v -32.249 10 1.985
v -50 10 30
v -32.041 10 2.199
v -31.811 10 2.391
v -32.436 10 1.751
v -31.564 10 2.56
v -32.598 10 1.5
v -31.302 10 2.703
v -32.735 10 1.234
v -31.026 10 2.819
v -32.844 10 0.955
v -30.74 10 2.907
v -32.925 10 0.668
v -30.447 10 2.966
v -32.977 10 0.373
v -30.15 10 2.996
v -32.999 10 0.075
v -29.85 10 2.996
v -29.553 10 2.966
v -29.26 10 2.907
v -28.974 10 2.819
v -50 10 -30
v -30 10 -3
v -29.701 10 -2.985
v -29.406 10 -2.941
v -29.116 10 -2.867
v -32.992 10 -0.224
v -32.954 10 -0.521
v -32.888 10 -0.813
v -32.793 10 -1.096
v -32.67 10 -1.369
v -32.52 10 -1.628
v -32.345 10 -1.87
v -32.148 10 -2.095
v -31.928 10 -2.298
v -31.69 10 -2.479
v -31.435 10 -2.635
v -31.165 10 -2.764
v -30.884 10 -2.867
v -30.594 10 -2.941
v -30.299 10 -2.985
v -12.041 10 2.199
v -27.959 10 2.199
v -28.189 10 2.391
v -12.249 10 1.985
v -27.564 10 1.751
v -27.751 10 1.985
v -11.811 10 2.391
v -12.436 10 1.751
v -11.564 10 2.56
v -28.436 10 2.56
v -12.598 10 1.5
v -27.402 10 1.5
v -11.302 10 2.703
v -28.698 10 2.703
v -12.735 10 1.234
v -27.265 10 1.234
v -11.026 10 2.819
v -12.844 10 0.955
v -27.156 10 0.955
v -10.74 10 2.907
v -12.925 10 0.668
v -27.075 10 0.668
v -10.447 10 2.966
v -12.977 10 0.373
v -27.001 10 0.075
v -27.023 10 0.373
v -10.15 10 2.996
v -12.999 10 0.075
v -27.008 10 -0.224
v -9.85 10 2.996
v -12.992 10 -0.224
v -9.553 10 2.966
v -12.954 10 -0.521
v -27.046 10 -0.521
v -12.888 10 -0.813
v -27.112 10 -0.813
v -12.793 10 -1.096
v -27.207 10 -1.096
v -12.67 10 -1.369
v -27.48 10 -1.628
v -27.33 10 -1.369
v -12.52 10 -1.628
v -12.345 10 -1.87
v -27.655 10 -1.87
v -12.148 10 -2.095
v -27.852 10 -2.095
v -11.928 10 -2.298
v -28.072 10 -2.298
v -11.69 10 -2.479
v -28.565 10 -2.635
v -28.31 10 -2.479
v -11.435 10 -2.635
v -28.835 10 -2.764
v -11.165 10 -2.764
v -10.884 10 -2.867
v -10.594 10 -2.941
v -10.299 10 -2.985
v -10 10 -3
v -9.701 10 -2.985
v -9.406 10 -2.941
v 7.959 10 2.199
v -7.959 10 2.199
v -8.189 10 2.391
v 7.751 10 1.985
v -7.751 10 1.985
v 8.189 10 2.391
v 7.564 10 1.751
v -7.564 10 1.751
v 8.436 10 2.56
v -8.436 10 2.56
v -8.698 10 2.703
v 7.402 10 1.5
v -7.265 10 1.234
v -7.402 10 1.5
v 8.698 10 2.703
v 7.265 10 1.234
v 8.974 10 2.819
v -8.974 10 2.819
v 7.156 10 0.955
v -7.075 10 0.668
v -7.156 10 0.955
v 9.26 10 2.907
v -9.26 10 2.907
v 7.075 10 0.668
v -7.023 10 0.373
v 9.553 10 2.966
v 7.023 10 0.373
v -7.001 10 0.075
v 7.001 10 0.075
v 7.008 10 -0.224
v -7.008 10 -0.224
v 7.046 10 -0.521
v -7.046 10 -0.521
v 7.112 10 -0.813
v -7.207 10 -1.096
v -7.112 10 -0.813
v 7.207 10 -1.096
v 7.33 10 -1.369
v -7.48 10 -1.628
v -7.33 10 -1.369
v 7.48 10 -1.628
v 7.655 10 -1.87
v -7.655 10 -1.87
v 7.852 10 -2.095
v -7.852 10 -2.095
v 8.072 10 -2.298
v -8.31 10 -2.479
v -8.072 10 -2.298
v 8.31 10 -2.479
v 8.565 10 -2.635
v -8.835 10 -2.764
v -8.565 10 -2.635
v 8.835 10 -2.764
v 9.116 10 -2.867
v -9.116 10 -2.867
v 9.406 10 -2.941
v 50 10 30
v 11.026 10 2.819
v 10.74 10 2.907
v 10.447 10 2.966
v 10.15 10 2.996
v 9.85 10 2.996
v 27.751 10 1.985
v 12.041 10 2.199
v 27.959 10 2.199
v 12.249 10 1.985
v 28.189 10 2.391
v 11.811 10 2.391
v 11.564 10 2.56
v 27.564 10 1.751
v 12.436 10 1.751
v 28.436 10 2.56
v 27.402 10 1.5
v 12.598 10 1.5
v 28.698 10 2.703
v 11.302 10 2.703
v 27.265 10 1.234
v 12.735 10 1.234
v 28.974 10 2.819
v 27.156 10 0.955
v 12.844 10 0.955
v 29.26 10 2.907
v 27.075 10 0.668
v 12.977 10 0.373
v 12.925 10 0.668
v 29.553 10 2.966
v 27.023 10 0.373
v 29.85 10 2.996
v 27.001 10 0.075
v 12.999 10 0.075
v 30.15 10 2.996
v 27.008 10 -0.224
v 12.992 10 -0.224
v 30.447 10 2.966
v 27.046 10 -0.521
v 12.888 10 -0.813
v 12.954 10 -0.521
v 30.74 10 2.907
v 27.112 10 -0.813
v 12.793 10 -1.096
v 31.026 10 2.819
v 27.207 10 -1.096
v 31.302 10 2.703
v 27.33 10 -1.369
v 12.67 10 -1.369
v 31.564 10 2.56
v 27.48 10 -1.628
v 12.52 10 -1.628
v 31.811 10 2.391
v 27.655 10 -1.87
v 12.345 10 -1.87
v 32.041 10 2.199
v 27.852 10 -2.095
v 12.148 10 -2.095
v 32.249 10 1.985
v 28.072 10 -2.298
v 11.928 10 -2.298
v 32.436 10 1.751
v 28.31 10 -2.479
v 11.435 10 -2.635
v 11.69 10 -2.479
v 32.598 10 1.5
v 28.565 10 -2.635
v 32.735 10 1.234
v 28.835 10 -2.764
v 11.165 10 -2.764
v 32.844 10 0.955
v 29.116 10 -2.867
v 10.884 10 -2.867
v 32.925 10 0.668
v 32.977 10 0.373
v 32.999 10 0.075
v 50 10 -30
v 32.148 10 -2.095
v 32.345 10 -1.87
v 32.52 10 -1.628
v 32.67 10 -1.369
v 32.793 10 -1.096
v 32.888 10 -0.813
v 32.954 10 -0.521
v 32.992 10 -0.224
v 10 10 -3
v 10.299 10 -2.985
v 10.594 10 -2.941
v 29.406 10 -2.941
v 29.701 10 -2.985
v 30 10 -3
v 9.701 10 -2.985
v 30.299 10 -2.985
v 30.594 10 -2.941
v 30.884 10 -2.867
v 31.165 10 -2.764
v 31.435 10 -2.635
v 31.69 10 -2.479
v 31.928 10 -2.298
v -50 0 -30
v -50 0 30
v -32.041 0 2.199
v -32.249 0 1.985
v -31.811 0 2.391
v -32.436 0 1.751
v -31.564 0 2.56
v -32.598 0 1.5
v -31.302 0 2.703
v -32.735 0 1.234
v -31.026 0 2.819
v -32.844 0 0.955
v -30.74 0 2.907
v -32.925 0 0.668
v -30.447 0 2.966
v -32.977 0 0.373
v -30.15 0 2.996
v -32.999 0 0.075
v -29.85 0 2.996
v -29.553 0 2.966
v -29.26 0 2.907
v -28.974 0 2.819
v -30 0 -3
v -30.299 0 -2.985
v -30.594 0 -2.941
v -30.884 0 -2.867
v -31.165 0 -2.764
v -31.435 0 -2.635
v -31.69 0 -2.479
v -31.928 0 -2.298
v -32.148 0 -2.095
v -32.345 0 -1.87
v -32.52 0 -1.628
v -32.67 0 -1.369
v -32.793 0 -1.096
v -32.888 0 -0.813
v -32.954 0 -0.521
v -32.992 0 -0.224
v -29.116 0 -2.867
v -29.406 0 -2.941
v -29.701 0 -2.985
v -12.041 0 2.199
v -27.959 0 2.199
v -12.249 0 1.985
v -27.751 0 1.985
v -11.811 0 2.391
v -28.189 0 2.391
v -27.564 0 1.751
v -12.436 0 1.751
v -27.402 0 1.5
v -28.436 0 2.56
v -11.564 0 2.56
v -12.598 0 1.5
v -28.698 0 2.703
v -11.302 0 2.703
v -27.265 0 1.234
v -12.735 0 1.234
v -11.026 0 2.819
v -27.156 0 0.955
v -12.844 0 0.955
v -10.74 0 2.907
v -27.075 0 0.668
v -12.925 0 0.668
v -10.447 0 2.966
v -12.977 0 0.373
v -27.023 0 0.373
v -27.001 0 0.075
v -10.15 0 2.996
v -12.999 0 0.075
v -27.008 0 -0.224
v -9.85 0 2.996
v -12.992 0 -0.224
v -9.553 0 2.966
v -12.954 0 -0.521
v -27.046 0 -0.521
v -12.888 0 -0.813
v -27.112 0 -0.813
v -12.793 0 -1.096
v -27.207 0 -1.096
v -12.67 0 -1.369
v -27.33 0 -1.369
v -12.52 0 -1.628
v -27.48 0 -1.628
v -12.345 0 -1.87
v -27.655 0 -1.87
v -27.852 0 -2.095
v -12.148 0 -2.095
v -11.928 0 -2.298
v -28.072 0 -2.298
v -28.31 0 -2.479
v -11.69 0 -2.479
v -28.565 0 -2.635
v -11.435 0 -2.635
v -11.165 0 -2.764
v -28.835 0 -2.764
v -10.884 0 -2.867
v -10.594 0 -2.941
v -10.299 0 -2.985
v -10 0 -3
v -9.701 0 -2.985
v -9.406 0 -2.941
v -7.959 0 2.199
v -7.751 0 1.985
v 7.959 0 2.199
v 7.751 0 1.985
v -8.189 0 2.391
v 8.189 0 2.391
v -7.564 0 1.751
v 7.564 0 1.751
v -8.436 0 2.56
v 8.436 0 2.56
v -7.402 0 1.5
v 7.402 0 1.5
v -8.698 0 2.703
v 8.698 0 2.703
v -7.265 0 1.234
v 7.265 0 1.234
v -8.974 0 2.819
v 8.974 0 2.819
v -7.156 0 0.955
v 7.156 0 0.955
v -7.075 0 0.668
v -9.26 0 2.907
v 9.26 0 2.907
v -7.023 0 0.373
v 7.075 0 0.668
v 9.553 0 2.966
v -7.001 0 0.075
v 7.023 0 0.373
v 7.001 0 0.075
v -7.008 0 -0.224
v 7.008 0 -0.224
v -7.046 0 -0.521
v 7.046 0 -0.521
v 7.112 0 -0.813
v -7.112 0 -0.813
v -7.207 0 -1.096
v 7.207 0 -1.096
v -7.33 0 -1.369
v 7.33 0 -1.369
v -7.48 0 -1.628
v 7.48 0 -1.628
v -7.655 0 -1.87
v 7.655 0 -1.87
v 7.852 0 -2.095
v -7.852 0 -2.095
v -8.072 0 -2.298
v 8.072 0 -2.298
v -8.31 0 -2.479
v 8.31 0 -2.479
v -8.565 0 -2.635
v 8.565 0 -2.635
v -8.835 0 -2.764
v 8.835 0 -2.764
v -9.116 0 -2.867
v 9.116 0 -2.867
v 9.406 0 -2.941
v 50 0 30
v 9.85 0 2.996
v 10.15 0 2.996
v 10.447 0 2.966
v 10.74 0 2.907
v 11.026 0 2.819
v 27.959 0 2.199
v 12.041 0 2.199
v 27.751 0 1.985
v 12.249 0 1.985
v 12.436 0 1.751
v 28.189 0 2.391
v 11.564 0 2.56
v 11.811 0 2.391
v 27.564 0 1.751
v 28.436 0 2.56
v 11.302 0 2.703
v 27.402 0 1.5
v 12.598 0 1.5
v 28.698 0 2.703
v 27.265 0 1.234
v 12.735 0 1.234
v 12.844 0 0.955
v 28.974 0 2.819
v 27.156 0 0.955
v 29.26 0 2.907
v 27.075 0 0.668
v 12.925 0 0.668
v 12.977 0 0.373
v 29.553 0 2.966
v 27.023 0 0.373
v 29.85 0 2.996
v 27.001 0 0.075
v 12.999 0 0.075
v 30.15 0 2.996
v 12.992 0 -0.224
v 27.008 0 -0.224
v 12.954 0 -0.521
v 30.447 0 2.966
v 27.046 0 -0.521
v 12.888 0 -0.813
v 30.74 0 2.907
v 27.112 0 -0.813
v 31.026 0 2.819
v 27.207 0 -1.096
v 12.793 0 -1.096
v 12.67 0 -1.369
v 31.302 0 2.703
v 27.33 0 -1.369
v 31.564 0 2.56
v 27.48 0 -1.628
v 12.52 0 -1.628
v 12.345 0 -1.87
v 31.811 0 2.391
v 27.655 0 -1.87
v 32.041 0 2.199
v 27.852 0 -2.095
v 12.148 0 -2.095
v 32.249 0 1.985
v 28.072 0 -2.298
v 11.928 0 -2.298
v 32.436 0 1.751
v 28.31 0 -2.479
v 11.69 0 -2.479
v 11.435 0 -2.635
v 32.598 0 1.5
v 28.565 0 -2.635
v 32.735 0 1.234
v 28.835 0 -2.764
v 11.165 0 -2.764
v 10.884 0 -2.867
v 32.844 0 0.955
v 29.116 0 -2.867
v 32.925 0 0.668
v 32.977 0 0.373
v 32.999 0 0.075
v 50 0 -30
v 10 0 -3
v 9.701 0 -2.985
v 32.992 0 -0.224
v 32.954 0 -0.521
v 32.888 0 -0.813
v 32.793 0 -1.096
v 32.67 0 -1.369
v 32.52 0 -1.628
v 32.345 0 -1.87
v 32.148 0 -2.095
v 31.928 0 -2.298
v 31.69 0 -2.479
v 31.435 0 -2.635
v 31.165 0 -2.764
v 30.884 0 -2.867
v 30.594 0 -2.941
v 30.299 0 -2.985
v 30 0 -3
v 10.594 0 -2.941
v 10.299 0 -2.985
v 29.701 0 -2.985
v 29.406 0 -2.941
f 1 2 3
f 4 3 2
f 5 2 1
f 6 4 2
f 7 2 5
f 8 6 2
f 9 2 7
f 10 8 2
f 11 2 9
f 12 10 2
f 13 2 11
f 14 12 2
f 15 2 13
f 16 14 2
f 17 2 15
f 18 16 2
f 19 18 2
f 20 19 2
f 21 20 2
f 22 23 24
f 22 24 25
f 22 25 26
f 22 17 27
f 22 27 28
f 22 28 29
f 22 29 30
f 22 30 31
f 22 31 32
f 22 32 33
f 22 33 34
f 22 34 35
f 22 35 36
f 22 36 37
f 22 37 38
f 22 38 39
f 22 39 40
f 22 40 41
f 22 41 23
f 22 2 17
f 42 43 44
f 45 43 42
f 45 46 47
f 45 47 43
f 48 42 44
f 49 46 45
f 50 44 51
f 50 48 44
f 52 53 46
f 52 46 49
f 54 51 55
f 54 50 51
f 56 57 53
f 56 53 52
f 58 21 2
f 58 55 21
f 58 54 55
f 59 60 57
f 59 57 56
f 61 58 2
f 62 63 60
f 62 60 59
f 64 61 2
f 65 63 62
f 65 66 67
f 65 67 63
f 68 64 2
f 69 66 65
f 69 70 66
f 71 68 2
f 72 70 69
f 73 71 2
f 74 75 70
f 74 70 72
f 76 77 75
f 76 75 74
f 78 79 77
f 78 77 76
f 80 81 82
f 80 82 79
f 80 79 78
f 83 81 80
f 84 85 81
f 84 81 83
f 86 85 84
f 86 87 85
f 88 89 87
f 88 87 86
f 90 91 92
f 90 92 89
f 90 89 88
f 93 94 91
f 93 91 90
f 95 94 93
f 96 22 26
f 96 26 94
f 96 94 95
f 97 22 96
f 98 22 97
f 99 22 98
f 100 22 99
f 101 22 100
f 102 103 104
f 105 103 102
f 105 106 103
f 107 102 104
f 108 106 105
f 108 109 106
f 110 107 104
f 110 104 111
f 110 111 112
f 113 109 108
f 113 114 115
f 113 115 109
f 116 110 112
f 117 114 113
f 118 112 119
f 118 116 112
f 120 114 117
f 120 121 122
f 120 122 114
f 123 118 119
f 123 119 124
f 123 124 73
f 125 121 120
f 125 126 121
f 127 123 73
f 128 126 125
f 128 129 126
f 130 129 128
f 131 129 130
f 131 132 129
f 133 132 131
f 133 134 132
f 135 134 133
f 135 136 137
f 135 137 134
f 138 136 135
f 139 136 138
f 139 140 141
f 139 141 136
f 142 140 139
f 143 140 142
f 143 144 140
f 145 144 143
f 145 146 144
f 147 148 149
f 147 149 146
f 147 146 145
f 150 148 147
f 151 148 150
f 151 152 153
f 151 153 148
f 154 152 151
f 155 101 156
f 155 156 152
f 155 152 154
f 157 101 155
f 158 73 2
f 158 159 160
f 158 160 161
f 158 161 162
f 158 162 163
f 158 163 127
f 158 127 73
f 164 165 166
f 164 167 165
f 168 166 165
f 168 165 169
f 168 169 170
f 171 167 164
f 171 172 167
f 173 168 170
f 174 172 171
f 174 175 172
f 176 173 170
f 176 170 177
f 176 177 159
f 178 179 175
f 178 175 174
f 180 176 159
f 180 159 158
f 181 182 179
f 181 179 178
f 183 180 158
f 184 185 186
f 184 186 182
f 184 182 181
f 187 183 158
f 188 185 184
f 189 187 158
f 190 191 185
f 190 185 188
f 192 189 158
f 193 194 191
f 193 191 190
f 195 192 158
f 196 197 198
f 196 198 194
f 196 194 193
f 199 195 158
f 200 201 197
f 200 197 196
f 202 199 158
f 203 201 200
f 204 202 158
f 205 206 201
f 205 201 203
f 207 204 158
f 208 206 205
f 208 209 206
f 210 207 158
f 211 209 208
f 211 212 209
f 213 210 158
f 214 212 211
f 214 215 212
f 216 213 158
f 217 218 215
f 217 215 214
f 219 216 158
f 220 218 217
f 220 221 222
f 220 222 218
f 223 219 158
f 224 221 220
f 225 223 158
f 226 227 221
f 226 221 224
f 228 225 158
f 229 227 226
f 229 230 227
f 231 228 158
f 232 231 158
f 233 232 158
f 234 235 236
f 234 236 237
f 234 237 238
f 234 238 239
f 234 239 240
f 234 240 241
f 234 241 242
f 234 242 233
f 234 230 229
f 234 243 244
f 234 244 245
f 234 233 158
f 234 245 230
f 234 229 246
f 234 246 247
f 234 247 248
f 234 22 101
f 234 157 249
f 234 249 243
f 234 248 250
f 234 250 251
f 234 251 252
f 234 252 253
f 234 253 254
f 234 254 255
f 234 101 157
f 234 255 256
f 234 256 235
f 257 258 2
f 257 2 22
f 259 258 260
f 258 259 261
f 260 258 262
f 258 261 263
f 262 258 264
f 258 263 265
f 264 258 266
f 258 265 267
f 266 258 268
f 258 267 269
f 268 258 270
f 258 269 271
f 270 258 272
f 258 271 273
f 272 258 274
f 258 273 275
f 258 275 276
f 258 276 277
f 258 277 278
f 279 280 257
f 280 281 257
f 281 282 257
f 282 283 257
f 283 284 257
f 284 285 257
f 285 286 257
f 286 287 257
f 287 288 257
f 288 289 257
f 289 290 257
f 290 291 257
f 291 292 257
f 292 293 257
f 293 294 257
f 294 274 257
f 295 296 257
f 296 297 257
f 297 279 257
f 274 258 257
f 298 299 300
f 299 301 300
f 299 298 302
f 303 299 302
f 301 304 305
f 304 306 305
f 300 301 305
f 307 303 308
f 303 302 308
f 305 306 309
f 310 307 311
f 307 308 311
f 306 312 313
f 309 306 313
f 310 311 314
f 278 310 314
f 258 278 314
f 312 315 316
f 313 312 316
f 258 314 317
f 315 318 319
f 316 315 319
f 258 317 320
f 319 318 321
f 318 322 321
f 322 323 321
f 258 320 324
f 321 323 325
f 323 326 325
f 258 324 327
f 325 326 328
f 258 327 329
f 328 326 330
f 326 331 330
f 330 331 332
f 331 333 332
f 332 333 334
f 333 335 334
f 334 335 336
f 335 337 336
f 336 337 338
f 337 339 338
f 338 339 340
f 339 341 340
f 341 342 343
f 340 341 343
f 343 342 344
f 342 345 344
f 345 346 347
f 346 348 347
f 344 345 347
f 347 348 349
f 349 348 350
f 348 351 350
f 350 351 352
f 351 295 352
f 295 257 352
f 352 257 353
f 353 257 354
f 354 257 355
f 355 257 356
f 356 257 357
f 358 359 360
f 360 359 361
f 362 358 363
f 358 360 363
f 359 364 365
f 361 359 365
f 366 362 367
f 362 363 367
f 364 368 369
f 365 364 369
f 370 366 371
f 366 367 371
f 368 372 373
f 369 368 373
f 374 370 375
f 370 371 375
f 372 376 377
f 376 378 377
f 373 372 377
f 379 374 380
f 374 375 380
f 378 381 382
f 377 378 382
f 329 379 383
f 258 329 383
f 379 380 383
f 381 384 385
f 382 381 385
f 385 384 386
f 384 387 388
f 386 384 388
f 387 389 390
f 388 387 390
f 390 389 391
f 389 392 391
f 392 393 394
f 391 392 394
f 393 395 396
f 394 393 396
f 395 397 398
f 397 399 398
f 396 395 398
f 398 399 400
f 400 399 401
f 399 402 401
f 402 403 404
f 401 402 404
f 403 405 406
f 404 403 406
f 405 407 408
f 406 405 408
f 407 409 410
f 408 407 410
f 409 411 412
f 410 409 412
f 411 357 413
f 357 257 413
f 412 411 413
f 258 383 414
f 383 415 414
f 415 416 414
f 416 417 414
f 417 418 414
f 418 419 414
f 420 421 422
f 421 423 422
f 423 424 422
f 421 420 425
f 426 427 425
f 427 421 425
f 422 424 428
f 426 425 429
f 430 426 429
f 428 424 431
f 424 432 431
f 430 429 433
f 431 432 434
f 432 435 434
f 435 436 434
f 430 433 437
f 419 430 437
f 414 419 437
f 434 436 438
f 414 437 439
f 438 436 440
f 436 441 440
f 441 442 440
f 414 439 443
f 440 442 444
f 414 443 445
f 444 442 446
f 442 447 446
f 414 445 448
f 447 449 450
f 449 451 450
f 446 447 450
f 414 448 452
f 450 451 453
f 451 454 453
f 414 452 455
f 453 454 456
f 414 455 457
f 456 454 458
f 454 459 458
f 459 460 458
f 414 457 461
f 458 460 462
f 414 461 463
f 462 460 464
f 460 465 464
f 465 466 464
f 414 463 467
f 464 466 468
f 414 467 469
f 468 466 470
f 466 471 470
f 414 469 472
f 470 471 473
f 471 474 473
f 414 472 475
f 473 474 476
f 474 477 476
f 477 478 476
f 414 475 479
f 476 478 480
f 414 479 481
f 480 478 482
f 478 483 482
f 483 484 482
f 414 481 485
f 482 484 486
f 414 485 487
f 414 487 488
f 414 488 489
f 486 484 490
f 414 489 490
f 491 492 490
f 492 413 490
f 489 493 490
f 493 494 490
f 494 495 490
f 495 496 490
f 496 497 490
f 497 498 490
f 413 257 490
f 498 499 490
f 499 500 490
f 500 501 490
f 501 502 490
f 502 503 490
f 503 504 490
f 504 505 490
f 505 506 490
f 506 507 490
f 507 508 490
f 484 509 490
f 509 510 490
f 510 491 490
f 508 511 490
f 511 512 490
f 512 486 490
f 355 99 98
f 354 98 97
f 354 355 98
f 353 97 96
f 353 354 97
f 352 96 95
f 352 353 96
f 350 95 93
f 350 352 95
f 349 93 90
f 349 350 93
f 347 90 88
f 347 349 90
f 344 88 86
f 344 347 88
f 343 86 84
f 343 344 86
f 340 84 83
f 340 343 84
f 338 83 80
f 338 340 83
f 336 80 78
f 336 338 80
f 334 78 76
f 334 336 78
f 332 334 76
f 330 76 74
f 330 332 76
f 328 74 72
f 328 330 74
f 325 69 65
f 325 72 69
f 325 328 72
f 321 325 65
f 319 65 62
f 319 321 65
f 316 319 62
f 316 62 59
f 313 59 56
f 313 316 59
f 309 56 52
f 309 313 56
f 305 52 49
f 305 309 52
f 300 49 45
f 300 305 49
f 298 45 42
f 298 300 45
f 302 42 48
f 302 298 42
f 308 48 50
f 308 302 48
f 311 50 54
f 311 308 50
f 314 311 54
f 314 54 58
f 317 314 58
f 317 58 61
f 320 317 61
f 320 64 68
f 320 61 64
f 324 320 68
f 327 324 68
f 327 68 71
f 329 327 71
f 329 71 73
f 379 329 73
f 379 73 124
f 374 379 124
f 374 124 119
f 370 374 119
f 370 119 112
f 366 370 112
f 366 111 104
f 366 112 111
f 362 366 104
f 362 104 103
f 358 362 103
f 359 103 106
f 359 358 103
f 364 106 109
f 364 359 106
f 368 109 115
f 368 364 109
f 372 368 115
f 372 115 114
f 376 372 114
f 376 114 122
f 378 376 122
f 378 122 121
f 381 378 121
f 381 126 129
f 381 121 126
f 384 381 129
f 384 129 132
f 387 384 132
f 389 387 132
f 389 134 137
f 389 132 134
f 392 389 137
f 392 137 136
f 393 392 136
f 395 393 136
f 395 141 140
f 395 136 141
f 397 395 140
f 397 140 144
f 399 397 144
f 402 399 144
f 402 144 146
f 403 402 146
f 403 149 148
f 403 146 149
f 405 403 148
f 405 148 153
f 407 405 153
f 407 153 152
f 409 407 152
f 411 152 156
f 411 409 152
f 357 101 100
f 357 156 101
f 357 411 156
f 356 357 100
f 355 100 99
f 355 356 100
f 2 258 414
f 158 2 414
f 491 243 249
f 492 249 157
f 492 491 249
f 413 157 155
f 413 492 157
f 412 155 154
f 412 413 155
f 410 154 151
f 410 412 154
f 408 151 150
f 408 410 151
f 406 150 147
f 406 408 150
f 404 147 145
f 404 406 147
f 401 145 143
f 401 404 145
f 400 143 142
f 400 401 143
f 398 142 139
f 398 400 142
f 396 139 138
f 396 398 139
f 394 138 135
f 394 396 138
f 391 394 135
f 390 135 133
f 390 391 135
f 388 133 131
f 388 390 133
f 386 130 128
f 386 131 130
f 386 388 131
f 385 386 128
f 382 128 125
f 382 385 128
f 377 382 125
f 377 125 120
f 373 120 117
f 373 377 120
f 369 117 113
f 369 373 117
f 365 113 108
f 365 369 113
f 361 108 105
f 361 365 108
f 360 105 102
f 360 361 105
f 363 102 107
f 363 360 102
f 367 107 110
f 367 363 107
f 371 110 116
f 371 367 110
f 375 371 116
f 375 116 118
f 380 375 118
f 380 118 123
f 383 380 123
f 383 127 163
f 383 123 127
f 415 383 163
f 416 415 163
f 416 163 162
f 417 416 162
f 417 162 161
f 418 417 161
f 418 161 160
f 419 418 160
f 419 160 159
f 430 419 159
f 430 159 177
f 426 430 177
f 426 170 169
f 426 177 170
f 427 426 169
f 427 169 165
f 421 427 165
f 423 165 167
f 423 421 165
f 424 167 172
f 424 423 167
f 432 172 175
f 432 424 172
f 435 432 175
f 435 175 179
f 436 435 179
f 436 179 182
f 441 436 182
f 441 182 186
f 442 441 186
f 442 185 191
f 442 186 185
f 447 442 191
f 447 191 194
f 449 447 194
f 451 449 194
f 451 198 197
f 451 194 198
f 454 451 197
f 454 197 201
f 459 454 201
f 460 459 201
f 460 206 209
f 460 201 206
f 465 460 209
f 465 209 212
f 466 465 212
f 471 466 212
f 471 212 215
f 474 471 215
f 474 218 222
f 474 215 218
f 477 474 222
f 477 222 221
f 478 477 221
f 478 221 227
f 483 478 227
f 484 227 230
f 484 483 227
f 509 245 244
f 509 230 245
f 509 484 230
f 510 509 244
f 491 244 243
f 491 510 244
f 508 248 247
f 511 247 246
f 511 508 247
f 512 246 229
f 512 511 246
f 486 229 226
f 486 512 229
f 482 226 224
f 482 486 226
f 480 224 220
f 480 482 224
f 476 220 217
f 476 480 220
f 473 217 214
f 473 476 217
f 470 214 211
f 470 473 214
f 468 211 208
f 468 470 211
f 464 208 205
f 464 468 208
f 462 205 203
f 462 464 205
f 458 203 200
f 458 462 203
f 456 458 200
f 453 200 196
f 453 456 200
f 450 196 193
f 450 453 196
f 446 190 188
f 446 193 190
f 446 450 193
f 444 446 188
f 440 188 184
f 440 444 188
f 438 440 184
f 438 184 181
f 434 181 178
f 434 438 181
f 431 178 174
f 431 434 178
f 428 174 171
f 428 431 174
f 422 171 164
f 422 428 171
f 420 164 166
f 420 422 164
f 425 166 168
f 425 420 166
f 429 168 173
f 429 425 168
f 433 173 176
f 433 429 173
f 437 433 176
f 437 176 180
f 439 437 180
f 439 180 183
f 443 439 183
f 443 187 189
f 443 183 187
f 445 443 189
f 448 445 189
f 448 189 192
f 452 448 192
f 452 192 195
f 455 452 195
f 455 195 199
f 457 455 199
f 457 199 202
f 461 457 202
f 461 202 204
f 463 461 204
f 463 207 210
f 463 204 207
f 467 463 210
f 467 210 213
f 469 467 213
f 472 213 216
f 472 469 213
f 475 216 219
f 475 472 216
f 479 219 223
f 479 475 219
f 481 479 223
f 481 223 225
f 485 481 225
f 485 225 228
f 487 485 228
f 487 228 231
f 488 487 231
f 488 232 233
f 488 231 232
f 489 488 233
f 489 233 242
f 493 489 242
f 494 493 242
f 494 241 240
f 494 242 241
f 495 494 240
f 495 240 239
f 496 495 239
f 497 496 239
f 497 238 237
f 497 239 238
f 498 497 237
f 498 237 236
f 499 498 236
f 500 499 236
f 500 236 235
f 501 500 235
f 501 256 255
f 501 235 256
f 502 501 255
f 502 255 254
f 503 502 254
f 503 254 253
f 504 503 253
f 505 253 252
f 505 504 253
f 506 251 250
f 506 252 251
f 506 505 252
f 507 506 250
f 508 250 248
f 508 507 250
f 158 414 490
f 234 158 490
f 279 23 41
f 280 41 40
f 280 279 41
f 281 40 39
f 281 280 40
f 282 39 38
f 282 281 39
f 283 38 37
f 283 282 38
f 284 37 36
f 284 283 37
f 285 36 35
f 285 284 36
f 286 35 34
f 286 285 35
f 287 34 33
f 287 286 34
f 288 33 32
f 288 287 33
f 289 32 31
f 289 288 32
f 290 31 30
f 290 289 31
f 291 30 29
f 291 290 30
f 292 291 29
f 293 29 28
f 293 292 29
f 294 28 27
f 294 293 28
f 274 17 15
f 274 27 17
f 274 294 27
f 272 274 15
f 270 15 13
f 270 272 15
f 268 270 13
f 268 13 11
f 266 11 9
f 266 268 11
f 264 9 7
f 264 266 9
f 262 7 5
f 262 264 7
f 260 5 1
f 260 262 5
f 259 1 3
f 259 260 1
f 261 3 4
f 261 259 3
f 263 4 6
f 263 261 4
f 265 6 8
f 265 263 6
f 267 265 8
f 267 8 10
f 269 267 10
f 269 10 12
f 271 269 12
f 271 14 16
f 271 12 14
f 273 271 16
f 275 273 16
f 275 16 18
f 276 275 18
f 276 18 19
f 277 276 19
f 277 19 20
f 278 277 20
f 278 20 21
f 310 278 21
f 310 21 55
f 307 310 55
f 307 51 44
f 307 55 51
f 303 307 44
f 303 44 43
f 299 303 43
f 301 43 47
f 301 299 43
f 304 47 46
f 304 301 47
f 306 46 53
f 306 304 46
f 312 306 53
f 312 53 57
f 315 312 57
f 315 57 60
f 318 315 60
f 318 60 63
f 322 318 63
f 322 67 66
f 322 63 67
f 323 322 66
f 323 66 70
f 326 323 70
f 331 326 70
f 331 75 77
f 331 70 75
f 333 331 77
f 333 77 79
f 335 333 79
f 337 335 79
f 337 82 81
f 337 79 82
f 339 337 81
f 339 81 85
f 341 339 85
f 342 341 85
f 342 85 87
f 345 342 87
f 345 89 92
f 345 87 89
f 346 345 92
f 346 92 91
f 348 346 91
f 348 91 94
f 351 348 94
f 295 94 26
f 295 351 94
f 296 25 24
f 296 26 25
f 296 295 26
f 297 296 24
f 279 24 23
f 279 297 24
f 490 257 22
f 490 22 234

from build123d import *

# Parameters (mm, degrees)
SKETCH_1_W             = 100
SKETCH_1_H             = 60
EXTRUDE_1_DEPTH        = 10
SKETCH_2_R             = 3
CUT_EXTRUDE_1_DEPTH    = 20
PATTERN_LINEAR_1_COUNT = 4
PATTERN_LINEAR_1_PITCH = 20


with BuildPart() as part:
    # 草图1 → 凸台-拉伸1 (new body)
    with BuildSketch(Plane(origin=(0, 0, 0), x_dir=(1, 0, 0), z_dir=(0, 1, 0))):
        Rectangle(SKETCH_1_W, SKETCH_1_H)
    extrude(amount=EXTRUDE_1_DEPTH)

    # 草图2 → 切除-拉伸1 (cut)
    with BuildSketch(Plane(origin=(0, 0, 0), x_dir=(1, 0, 0), z_dir=(0, 1, 0))):
        with Locations(Location((-30, 0, 0), (0, 0, 90))):
            Circle(SKETCH_2_R)
    cut_extrude_1 = extrude(amount=CUT_EXTRUDE_1_DEPTH, mode=Mode.SUBTRACT)

    # 阵列(线性)1: 切除-拉伸1 ×4
    with Locations(*[(i * PATTERN_LINEAR_1_PITCH, 0, 0) for i in range(1, PATTERN_LINEAR_1_COUNT)]):
        add(cut_extrude_1, mode=Mode.SUBTRACT)


solid = part.part
